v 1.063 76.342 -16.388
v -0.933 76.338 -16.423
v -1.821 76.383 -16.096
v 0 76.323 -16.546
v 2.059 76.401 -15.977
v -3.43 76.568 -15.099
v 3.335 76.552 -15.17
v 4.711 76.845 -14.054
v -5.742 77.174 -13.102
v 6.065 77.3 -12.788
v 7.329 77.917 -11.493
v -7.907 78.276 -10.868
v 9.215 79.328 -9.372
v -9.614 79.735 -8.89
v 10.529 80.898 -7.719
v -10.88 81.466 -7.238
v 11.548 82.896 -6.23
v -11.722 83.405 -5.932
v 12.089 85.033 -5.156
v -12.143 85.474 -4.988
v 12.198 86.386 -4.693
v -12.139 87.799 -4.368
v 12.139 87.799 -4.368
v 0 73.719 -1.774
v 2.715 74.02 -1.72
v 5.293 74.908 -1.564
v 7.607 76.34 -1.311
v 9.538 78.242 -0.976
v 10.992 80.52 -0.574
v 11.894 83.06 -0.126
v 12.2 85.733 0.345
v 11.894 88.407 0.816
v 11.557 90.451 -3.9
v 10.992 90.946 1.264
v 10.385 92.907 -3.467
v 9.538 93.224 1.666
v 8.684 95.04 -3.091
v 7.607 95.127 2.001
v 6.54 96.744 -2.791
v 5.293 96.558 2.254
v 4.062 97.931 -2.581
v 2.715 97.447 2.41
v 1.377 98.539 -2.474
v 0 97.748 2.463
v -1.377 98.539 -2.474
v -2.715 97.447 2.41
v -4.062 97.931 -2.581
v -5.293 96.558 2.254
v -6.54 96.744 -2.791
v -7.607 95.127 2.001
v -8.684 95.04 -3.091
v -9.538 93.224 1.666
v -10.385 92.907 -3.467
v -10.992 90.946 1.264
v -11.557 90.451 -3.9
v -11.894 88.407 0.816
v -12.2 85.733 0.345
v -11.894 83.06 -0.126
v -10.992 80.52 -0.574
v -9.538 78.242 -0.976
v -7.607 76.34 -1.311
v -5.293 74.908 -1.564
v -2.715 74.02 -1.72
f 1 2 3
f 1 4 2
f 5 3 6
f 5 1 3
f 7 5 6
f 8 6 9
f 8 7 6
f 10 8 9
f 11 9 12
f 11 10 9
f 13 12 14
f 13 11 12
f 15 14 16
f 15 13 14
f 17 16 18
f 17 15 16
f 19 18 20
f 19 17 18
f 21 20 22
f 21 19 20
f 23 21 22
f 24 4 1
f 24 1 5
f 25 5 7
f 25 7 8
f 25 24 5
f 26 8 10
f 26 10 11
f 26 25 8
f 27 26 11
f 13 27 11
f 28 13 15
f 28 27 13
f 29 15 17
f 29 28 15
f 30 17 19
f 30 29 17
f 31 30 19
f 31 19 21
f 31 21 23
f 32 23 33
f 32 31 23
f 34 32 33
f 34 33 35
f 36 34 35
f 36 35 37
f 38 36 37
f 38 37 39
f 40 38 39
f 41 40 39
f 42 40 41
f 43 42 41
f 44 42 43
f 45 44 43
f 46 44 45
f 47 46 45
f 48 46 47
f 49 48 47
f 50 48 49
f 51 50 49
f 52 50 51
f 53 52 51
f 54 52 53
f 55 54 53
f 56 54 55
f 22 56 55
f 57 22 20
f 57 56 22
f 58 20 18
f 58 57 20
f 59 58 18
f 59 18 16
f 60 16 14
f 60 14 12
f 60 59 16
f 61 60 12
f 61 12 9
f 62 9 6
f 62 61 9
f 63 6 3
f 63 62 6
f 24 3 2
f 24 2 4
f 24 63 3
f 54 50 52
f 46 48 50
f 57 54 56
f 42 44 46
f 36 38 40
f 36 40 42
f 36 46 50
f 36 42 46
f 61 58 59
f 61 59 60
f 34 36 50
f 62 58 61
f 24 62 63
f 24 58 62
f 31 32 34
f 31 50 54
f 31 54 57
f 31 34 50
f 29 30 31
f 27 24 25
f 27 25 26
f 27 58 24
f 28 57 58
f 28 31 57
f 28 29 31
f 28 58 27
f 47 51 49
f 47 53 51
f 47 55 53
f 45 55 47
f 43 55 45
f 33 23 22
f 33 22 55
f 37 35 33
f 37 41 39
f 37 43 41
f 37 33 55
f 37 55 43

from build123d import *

# Parameters (mm, degrees)
SKETCH2_R           = 12.2
BOSS_EXTRUDE1_DEPTH = 15
BOSS_EXTRUDE2_DEPTH = 25


with BuildPart() as part:
    # Sketch2 → Boss-Extrude1 (new body)
    with BuildSketch(Plane(origin=(0, 2.526178565, -14.326670571), x_dir=(0, -0.984807753, -0.173648178), z_dir=(0, -0.173648178, 0.984807753))):
        with Locations((-84.490615604, 0)):
            Circle(SKETCH2_R)
    extrude(amount=-BOSS_EXTRUDE1_DEPTH)


with BuildPart() as body_2:
    # Sketch1 → Boss-Extrude2 (new body, symmetric)
    with BuildSketch(Plane(origin=(0, 0, 0), x_dir=(0, 0, -1), z_dir=(1, 0, 0))):
        with BuildLine():
            Line((4.367840897, 87.799360654), (2.460560139, 98.616087344))
            Line((2.460560139, 98.616087344), (1.59231925, 103.540126109))
            Line((1.59231925, 103.540126109), (11.44039678, 105.276607886))
            Line((11.44039678, 105.276607886), (16.545653204, 76.323259947))
            ThreePointArc((16.545653204, 76.323259947), (8.553554718, 80.041746373), (4.367840897, 87.799360654))
        make_face()
    extrude(amount=BOSS_EXTRUDE2_DEPTH, both=True)


with BuildPart() as part_1:
    add(part.part)

    # Combine1: cut body 2
    add(body_2.part, mode=Mode.SUBTRACT)


solid = part_1.part
